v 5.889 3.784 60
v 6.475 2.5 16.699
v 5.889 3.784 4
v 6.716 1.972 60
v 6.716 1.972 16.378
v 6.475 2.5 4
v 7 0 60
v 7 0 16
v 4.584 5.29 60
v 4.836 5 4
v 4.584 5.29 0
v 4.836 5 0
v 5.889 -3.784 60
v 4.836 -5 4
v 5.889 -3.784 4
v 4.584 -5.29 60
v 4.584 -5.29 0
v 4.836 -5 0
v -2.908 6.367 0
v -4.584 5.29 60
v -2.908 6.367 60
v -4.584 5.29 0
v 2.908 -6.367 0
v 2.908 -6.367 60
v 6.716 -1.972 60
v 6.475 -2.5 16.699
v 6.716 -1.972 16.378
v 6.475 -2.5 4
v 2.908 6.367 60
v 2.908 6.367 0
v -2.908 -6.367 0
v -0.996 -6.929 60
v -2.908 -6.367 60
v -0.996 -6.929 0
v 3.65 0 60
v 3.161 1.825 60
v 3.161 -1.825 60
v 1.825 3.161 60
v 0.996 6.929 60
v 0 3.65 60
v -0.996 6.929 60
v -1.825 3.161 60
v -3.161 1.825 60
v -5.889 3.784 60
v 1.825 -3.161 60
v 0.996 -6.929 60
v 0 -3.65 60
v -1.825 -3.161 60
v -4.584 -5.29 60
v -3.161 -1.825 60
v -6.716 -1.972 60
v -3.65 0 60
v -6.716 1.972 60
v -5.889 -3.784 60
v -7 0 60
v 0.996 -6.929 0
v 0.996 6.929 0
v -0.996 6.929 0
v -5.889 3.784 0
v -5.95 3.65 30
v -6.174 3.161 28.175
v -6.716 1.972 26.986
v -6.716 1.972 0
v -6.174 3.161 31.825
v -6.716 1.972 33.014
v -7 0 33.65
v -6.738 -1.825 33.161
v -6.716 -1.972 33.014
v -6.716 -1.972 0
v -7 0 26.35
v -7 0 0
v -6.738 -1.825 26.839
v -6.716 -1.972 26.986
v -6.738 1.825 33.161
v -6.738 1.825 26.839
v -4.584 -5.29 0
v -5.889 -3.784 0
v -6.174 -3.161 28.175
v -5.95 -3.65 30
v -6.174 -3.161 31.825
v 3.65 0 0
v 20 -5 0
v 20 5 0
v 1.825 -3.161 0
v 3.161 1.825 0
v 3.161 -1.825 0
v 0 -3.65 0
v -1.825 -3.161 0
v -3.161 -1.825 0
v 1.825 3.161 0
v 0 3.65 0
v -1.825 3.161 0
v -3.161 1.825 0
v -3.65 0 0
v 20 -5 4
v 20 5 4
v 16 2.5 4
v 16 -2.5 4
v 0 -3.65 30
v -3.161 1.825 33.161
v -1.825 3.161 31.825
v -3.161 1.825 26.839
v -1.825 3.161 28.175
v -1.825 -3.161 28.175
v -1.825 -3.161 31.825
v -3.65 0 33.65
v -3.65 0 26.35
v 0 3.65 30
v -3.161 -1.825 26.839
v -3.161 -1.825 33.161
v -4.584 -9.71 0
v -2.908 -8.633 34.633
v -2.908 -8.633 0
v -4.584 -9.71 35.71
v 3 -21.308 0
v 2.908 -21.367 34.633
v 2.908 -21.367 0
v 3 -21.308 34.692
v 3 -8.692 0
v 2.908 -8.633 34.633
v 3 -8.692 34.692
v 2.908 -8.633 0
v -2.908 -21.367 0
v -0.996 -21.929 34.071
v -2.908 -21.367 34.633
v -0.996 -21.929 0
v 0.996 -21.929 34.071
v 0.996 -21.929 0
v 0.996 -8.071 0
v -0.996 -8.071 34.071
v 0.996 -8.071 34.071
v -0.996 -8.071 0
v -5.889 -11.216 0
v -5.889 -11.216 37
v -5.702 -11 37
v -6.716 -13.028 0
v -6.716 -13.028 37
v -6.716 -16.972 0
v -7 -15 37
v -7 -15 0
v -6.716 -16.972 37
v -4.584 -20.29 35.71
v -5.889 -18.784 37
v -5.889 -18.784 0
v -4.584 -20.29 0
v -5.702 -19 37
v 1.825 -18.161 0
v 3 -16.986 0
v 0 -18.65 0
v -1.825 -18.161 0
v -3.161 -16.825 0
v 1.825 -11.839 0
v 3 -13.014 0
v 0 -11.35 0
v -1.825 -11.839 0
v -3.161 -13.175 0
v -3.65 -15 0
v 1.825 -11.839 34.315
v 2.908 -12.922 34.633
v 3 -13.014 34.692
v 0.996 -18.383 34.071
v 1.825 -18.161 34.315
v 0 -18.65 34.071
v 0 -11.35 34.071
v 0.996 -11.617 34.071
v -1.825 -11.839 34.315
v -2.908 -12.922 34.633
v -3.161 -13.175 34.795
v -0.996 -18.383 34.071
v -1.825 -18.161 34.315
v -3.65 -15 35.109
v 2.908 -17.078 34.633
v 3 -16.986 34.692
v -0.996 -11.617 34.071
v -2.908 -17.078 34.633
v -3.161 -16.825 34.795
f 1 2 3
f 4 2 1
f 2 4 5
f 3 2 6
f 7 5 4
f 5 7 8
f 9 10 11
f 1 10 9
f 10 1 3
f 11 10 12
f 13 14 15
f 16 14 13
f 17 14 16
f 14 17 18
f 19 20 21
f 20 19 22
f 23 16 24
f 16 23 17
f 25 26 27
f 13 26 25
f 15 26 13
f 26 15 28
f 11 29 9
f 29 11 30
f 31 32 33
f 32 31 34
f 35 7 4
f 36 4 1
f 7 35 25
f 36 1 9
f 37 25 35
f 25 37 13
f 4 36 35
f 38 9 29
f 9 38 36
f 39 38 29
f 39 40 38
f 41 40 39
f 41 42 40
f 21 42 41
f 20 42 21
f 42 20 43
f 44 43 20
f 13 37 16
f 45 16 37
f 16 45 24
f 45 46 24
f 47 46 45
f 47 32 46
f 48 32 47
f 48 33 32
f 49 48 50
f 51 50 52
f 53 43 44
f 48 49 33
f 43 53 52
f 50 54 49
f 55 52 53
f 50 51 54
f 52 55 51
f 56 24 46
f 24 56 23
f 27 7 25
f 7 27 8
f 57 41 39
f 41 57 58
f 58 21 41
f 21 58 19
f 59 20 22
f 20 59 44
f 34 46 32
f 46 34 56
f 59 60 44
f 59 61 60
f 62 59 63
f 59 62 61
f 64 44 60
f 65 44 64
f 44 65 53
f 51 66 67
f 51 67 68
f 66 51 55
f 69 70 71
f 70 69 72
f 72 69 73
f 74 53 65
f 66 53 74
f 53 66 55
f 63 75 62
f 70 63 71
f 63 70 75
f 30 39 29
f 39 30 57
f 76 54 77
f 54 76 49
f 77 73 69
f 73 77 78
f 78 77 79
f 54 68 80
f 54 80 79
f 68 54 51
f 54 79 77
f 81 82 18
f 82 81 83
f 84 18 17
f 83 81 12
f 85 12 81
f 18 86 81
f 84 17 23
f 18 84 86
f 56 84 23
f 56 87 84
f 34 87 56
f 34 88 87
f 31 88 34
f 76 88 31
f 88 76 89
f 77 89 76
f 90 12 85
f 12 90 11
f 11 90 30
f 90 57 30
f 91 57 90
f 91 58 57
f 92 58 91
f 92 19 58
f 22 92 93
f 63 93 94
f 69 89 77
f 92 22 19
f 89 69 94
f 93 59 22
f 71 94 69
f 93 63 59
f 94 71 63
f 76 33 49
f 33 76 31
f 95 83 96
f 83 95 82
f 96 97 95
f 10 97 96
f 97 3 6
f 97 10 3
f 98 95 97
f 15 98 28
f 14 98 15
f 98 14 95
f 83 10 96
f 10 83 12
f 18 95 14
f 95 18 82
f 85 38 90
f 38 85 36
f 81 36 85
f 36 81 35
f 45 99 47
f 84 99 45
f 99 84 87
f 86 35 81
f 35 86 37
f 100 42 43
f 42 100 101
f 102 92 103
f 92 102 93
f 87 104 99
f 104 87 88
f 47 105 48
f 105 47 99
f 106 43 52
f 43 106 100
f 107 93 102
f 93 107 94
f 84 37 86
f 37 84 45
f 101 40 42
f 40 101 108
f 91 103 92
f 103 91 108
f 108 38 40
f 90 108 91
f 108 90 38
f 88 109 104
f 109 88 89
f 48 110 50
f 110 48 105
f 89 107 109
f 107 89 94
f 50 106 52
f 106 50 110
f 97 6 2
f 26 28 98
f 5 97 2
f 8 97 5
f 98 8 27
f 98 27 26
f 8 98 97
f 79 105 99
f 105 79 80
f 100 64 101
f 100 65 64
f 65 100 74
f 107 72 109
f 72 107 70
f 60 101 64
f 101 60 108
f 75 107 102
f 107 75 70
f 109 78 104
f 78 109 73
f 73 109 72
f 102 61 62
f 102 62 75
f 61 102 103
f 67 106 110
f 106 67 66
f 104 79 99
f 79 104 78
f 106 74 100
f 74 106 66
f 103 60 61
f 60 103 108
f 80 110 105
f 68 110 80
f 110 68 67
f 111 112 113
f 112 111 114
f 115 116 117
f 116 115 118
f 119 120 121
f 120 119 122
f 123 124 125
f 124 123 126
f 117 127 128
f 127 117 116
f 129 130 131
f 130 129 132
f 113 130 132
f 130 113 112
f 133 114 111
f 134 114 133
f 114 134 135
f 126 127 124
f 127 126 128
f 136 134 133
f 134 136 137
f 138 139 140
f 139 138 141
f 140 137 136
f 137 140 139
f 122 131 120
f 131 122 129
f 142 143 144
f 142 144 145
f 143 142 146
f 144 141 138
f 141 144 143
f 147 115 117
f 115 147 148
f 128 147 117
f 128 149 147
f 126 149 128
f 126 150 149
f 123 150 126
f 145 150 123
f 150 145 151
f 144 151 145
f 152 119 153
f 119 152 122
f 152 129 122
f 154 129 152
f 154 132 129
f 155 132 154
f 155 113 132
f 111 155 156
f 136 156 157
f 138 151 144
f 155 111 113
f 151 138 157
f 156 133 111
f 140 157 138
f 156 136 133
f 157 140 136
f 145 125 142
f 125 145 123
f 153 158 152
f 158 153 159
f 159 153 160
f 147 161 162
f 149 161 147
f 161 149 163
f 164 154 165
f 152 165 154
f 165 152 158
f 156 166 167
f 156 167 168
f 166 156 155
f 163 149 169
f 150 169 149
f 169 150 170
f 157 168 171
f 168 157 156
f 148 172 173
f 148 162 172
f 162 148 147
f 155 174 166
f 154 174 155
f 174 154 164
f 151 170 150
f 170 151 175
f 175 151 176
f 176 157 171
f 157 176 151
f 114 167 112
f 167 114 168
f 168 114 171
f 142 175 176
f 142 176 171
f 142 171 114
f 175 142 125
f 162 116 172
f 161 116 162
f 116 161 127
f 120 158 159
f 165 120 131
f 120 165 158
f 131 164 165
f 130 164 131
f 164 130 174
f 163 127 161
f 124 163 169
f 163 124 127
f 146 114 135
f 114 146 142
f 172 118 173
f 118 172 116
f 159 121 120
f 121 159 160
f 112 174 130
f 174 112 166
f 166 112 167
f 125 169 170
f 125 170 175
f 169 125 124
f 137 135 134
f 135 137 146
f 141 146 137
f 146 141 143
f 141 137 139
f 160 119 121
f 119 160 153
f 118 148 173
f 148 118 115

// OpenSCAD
path_pts = [
    [0, 0],
    [15, 0],
    [0, 20]
];
union(){
difference(){
{difference(){
union(){
{union(){
difference(){

union(){cylinder(60, 7,7);
    translate([10,0,2]) cube([20,10,4], center = true);
}


    cylinder(60, 7.3/2,7.3/2);
}



rotate([90, 0,0]) translate([4,0,-2.5]) linear_extrude(5) polygon(path_pts);
}}





{translate([-40,0,20])
rotate([0,90,0]) {



difference(){

cylinder(0, 18,18);
  cylinder(0, 7.3/2,7.3/2);
}
}}}



color("red")
{translate([-60,0,30])
rotate([0,90,0]) {


cylinder(60, 7.3/2,7.3/2);
}}}}
cylinder(60, 7.3/2,7.3/2);
}



//add a block in the hole if necessary
//translate([-4.8, -.75, 10]) cube([1.5,1.5,20]);
}




difference(){
{difference(){
{difference(){
translate([0,-15,0]){
    difference(){
cylinder(40, 7,7);
  cylinder(40, 7.3/2,7.3/2);}}
  
  
 translate([0,-5, 41]) rotate([90,0,0]) cylinder(40, 7,7);}}
 
 
 translate([-7,-22.5,37]) cube(15);}}
 
 
 
 // slit to see amount of pollen
 
 
 
 translate([3,-23 ,0]) cube([5, 20, 40]);}
